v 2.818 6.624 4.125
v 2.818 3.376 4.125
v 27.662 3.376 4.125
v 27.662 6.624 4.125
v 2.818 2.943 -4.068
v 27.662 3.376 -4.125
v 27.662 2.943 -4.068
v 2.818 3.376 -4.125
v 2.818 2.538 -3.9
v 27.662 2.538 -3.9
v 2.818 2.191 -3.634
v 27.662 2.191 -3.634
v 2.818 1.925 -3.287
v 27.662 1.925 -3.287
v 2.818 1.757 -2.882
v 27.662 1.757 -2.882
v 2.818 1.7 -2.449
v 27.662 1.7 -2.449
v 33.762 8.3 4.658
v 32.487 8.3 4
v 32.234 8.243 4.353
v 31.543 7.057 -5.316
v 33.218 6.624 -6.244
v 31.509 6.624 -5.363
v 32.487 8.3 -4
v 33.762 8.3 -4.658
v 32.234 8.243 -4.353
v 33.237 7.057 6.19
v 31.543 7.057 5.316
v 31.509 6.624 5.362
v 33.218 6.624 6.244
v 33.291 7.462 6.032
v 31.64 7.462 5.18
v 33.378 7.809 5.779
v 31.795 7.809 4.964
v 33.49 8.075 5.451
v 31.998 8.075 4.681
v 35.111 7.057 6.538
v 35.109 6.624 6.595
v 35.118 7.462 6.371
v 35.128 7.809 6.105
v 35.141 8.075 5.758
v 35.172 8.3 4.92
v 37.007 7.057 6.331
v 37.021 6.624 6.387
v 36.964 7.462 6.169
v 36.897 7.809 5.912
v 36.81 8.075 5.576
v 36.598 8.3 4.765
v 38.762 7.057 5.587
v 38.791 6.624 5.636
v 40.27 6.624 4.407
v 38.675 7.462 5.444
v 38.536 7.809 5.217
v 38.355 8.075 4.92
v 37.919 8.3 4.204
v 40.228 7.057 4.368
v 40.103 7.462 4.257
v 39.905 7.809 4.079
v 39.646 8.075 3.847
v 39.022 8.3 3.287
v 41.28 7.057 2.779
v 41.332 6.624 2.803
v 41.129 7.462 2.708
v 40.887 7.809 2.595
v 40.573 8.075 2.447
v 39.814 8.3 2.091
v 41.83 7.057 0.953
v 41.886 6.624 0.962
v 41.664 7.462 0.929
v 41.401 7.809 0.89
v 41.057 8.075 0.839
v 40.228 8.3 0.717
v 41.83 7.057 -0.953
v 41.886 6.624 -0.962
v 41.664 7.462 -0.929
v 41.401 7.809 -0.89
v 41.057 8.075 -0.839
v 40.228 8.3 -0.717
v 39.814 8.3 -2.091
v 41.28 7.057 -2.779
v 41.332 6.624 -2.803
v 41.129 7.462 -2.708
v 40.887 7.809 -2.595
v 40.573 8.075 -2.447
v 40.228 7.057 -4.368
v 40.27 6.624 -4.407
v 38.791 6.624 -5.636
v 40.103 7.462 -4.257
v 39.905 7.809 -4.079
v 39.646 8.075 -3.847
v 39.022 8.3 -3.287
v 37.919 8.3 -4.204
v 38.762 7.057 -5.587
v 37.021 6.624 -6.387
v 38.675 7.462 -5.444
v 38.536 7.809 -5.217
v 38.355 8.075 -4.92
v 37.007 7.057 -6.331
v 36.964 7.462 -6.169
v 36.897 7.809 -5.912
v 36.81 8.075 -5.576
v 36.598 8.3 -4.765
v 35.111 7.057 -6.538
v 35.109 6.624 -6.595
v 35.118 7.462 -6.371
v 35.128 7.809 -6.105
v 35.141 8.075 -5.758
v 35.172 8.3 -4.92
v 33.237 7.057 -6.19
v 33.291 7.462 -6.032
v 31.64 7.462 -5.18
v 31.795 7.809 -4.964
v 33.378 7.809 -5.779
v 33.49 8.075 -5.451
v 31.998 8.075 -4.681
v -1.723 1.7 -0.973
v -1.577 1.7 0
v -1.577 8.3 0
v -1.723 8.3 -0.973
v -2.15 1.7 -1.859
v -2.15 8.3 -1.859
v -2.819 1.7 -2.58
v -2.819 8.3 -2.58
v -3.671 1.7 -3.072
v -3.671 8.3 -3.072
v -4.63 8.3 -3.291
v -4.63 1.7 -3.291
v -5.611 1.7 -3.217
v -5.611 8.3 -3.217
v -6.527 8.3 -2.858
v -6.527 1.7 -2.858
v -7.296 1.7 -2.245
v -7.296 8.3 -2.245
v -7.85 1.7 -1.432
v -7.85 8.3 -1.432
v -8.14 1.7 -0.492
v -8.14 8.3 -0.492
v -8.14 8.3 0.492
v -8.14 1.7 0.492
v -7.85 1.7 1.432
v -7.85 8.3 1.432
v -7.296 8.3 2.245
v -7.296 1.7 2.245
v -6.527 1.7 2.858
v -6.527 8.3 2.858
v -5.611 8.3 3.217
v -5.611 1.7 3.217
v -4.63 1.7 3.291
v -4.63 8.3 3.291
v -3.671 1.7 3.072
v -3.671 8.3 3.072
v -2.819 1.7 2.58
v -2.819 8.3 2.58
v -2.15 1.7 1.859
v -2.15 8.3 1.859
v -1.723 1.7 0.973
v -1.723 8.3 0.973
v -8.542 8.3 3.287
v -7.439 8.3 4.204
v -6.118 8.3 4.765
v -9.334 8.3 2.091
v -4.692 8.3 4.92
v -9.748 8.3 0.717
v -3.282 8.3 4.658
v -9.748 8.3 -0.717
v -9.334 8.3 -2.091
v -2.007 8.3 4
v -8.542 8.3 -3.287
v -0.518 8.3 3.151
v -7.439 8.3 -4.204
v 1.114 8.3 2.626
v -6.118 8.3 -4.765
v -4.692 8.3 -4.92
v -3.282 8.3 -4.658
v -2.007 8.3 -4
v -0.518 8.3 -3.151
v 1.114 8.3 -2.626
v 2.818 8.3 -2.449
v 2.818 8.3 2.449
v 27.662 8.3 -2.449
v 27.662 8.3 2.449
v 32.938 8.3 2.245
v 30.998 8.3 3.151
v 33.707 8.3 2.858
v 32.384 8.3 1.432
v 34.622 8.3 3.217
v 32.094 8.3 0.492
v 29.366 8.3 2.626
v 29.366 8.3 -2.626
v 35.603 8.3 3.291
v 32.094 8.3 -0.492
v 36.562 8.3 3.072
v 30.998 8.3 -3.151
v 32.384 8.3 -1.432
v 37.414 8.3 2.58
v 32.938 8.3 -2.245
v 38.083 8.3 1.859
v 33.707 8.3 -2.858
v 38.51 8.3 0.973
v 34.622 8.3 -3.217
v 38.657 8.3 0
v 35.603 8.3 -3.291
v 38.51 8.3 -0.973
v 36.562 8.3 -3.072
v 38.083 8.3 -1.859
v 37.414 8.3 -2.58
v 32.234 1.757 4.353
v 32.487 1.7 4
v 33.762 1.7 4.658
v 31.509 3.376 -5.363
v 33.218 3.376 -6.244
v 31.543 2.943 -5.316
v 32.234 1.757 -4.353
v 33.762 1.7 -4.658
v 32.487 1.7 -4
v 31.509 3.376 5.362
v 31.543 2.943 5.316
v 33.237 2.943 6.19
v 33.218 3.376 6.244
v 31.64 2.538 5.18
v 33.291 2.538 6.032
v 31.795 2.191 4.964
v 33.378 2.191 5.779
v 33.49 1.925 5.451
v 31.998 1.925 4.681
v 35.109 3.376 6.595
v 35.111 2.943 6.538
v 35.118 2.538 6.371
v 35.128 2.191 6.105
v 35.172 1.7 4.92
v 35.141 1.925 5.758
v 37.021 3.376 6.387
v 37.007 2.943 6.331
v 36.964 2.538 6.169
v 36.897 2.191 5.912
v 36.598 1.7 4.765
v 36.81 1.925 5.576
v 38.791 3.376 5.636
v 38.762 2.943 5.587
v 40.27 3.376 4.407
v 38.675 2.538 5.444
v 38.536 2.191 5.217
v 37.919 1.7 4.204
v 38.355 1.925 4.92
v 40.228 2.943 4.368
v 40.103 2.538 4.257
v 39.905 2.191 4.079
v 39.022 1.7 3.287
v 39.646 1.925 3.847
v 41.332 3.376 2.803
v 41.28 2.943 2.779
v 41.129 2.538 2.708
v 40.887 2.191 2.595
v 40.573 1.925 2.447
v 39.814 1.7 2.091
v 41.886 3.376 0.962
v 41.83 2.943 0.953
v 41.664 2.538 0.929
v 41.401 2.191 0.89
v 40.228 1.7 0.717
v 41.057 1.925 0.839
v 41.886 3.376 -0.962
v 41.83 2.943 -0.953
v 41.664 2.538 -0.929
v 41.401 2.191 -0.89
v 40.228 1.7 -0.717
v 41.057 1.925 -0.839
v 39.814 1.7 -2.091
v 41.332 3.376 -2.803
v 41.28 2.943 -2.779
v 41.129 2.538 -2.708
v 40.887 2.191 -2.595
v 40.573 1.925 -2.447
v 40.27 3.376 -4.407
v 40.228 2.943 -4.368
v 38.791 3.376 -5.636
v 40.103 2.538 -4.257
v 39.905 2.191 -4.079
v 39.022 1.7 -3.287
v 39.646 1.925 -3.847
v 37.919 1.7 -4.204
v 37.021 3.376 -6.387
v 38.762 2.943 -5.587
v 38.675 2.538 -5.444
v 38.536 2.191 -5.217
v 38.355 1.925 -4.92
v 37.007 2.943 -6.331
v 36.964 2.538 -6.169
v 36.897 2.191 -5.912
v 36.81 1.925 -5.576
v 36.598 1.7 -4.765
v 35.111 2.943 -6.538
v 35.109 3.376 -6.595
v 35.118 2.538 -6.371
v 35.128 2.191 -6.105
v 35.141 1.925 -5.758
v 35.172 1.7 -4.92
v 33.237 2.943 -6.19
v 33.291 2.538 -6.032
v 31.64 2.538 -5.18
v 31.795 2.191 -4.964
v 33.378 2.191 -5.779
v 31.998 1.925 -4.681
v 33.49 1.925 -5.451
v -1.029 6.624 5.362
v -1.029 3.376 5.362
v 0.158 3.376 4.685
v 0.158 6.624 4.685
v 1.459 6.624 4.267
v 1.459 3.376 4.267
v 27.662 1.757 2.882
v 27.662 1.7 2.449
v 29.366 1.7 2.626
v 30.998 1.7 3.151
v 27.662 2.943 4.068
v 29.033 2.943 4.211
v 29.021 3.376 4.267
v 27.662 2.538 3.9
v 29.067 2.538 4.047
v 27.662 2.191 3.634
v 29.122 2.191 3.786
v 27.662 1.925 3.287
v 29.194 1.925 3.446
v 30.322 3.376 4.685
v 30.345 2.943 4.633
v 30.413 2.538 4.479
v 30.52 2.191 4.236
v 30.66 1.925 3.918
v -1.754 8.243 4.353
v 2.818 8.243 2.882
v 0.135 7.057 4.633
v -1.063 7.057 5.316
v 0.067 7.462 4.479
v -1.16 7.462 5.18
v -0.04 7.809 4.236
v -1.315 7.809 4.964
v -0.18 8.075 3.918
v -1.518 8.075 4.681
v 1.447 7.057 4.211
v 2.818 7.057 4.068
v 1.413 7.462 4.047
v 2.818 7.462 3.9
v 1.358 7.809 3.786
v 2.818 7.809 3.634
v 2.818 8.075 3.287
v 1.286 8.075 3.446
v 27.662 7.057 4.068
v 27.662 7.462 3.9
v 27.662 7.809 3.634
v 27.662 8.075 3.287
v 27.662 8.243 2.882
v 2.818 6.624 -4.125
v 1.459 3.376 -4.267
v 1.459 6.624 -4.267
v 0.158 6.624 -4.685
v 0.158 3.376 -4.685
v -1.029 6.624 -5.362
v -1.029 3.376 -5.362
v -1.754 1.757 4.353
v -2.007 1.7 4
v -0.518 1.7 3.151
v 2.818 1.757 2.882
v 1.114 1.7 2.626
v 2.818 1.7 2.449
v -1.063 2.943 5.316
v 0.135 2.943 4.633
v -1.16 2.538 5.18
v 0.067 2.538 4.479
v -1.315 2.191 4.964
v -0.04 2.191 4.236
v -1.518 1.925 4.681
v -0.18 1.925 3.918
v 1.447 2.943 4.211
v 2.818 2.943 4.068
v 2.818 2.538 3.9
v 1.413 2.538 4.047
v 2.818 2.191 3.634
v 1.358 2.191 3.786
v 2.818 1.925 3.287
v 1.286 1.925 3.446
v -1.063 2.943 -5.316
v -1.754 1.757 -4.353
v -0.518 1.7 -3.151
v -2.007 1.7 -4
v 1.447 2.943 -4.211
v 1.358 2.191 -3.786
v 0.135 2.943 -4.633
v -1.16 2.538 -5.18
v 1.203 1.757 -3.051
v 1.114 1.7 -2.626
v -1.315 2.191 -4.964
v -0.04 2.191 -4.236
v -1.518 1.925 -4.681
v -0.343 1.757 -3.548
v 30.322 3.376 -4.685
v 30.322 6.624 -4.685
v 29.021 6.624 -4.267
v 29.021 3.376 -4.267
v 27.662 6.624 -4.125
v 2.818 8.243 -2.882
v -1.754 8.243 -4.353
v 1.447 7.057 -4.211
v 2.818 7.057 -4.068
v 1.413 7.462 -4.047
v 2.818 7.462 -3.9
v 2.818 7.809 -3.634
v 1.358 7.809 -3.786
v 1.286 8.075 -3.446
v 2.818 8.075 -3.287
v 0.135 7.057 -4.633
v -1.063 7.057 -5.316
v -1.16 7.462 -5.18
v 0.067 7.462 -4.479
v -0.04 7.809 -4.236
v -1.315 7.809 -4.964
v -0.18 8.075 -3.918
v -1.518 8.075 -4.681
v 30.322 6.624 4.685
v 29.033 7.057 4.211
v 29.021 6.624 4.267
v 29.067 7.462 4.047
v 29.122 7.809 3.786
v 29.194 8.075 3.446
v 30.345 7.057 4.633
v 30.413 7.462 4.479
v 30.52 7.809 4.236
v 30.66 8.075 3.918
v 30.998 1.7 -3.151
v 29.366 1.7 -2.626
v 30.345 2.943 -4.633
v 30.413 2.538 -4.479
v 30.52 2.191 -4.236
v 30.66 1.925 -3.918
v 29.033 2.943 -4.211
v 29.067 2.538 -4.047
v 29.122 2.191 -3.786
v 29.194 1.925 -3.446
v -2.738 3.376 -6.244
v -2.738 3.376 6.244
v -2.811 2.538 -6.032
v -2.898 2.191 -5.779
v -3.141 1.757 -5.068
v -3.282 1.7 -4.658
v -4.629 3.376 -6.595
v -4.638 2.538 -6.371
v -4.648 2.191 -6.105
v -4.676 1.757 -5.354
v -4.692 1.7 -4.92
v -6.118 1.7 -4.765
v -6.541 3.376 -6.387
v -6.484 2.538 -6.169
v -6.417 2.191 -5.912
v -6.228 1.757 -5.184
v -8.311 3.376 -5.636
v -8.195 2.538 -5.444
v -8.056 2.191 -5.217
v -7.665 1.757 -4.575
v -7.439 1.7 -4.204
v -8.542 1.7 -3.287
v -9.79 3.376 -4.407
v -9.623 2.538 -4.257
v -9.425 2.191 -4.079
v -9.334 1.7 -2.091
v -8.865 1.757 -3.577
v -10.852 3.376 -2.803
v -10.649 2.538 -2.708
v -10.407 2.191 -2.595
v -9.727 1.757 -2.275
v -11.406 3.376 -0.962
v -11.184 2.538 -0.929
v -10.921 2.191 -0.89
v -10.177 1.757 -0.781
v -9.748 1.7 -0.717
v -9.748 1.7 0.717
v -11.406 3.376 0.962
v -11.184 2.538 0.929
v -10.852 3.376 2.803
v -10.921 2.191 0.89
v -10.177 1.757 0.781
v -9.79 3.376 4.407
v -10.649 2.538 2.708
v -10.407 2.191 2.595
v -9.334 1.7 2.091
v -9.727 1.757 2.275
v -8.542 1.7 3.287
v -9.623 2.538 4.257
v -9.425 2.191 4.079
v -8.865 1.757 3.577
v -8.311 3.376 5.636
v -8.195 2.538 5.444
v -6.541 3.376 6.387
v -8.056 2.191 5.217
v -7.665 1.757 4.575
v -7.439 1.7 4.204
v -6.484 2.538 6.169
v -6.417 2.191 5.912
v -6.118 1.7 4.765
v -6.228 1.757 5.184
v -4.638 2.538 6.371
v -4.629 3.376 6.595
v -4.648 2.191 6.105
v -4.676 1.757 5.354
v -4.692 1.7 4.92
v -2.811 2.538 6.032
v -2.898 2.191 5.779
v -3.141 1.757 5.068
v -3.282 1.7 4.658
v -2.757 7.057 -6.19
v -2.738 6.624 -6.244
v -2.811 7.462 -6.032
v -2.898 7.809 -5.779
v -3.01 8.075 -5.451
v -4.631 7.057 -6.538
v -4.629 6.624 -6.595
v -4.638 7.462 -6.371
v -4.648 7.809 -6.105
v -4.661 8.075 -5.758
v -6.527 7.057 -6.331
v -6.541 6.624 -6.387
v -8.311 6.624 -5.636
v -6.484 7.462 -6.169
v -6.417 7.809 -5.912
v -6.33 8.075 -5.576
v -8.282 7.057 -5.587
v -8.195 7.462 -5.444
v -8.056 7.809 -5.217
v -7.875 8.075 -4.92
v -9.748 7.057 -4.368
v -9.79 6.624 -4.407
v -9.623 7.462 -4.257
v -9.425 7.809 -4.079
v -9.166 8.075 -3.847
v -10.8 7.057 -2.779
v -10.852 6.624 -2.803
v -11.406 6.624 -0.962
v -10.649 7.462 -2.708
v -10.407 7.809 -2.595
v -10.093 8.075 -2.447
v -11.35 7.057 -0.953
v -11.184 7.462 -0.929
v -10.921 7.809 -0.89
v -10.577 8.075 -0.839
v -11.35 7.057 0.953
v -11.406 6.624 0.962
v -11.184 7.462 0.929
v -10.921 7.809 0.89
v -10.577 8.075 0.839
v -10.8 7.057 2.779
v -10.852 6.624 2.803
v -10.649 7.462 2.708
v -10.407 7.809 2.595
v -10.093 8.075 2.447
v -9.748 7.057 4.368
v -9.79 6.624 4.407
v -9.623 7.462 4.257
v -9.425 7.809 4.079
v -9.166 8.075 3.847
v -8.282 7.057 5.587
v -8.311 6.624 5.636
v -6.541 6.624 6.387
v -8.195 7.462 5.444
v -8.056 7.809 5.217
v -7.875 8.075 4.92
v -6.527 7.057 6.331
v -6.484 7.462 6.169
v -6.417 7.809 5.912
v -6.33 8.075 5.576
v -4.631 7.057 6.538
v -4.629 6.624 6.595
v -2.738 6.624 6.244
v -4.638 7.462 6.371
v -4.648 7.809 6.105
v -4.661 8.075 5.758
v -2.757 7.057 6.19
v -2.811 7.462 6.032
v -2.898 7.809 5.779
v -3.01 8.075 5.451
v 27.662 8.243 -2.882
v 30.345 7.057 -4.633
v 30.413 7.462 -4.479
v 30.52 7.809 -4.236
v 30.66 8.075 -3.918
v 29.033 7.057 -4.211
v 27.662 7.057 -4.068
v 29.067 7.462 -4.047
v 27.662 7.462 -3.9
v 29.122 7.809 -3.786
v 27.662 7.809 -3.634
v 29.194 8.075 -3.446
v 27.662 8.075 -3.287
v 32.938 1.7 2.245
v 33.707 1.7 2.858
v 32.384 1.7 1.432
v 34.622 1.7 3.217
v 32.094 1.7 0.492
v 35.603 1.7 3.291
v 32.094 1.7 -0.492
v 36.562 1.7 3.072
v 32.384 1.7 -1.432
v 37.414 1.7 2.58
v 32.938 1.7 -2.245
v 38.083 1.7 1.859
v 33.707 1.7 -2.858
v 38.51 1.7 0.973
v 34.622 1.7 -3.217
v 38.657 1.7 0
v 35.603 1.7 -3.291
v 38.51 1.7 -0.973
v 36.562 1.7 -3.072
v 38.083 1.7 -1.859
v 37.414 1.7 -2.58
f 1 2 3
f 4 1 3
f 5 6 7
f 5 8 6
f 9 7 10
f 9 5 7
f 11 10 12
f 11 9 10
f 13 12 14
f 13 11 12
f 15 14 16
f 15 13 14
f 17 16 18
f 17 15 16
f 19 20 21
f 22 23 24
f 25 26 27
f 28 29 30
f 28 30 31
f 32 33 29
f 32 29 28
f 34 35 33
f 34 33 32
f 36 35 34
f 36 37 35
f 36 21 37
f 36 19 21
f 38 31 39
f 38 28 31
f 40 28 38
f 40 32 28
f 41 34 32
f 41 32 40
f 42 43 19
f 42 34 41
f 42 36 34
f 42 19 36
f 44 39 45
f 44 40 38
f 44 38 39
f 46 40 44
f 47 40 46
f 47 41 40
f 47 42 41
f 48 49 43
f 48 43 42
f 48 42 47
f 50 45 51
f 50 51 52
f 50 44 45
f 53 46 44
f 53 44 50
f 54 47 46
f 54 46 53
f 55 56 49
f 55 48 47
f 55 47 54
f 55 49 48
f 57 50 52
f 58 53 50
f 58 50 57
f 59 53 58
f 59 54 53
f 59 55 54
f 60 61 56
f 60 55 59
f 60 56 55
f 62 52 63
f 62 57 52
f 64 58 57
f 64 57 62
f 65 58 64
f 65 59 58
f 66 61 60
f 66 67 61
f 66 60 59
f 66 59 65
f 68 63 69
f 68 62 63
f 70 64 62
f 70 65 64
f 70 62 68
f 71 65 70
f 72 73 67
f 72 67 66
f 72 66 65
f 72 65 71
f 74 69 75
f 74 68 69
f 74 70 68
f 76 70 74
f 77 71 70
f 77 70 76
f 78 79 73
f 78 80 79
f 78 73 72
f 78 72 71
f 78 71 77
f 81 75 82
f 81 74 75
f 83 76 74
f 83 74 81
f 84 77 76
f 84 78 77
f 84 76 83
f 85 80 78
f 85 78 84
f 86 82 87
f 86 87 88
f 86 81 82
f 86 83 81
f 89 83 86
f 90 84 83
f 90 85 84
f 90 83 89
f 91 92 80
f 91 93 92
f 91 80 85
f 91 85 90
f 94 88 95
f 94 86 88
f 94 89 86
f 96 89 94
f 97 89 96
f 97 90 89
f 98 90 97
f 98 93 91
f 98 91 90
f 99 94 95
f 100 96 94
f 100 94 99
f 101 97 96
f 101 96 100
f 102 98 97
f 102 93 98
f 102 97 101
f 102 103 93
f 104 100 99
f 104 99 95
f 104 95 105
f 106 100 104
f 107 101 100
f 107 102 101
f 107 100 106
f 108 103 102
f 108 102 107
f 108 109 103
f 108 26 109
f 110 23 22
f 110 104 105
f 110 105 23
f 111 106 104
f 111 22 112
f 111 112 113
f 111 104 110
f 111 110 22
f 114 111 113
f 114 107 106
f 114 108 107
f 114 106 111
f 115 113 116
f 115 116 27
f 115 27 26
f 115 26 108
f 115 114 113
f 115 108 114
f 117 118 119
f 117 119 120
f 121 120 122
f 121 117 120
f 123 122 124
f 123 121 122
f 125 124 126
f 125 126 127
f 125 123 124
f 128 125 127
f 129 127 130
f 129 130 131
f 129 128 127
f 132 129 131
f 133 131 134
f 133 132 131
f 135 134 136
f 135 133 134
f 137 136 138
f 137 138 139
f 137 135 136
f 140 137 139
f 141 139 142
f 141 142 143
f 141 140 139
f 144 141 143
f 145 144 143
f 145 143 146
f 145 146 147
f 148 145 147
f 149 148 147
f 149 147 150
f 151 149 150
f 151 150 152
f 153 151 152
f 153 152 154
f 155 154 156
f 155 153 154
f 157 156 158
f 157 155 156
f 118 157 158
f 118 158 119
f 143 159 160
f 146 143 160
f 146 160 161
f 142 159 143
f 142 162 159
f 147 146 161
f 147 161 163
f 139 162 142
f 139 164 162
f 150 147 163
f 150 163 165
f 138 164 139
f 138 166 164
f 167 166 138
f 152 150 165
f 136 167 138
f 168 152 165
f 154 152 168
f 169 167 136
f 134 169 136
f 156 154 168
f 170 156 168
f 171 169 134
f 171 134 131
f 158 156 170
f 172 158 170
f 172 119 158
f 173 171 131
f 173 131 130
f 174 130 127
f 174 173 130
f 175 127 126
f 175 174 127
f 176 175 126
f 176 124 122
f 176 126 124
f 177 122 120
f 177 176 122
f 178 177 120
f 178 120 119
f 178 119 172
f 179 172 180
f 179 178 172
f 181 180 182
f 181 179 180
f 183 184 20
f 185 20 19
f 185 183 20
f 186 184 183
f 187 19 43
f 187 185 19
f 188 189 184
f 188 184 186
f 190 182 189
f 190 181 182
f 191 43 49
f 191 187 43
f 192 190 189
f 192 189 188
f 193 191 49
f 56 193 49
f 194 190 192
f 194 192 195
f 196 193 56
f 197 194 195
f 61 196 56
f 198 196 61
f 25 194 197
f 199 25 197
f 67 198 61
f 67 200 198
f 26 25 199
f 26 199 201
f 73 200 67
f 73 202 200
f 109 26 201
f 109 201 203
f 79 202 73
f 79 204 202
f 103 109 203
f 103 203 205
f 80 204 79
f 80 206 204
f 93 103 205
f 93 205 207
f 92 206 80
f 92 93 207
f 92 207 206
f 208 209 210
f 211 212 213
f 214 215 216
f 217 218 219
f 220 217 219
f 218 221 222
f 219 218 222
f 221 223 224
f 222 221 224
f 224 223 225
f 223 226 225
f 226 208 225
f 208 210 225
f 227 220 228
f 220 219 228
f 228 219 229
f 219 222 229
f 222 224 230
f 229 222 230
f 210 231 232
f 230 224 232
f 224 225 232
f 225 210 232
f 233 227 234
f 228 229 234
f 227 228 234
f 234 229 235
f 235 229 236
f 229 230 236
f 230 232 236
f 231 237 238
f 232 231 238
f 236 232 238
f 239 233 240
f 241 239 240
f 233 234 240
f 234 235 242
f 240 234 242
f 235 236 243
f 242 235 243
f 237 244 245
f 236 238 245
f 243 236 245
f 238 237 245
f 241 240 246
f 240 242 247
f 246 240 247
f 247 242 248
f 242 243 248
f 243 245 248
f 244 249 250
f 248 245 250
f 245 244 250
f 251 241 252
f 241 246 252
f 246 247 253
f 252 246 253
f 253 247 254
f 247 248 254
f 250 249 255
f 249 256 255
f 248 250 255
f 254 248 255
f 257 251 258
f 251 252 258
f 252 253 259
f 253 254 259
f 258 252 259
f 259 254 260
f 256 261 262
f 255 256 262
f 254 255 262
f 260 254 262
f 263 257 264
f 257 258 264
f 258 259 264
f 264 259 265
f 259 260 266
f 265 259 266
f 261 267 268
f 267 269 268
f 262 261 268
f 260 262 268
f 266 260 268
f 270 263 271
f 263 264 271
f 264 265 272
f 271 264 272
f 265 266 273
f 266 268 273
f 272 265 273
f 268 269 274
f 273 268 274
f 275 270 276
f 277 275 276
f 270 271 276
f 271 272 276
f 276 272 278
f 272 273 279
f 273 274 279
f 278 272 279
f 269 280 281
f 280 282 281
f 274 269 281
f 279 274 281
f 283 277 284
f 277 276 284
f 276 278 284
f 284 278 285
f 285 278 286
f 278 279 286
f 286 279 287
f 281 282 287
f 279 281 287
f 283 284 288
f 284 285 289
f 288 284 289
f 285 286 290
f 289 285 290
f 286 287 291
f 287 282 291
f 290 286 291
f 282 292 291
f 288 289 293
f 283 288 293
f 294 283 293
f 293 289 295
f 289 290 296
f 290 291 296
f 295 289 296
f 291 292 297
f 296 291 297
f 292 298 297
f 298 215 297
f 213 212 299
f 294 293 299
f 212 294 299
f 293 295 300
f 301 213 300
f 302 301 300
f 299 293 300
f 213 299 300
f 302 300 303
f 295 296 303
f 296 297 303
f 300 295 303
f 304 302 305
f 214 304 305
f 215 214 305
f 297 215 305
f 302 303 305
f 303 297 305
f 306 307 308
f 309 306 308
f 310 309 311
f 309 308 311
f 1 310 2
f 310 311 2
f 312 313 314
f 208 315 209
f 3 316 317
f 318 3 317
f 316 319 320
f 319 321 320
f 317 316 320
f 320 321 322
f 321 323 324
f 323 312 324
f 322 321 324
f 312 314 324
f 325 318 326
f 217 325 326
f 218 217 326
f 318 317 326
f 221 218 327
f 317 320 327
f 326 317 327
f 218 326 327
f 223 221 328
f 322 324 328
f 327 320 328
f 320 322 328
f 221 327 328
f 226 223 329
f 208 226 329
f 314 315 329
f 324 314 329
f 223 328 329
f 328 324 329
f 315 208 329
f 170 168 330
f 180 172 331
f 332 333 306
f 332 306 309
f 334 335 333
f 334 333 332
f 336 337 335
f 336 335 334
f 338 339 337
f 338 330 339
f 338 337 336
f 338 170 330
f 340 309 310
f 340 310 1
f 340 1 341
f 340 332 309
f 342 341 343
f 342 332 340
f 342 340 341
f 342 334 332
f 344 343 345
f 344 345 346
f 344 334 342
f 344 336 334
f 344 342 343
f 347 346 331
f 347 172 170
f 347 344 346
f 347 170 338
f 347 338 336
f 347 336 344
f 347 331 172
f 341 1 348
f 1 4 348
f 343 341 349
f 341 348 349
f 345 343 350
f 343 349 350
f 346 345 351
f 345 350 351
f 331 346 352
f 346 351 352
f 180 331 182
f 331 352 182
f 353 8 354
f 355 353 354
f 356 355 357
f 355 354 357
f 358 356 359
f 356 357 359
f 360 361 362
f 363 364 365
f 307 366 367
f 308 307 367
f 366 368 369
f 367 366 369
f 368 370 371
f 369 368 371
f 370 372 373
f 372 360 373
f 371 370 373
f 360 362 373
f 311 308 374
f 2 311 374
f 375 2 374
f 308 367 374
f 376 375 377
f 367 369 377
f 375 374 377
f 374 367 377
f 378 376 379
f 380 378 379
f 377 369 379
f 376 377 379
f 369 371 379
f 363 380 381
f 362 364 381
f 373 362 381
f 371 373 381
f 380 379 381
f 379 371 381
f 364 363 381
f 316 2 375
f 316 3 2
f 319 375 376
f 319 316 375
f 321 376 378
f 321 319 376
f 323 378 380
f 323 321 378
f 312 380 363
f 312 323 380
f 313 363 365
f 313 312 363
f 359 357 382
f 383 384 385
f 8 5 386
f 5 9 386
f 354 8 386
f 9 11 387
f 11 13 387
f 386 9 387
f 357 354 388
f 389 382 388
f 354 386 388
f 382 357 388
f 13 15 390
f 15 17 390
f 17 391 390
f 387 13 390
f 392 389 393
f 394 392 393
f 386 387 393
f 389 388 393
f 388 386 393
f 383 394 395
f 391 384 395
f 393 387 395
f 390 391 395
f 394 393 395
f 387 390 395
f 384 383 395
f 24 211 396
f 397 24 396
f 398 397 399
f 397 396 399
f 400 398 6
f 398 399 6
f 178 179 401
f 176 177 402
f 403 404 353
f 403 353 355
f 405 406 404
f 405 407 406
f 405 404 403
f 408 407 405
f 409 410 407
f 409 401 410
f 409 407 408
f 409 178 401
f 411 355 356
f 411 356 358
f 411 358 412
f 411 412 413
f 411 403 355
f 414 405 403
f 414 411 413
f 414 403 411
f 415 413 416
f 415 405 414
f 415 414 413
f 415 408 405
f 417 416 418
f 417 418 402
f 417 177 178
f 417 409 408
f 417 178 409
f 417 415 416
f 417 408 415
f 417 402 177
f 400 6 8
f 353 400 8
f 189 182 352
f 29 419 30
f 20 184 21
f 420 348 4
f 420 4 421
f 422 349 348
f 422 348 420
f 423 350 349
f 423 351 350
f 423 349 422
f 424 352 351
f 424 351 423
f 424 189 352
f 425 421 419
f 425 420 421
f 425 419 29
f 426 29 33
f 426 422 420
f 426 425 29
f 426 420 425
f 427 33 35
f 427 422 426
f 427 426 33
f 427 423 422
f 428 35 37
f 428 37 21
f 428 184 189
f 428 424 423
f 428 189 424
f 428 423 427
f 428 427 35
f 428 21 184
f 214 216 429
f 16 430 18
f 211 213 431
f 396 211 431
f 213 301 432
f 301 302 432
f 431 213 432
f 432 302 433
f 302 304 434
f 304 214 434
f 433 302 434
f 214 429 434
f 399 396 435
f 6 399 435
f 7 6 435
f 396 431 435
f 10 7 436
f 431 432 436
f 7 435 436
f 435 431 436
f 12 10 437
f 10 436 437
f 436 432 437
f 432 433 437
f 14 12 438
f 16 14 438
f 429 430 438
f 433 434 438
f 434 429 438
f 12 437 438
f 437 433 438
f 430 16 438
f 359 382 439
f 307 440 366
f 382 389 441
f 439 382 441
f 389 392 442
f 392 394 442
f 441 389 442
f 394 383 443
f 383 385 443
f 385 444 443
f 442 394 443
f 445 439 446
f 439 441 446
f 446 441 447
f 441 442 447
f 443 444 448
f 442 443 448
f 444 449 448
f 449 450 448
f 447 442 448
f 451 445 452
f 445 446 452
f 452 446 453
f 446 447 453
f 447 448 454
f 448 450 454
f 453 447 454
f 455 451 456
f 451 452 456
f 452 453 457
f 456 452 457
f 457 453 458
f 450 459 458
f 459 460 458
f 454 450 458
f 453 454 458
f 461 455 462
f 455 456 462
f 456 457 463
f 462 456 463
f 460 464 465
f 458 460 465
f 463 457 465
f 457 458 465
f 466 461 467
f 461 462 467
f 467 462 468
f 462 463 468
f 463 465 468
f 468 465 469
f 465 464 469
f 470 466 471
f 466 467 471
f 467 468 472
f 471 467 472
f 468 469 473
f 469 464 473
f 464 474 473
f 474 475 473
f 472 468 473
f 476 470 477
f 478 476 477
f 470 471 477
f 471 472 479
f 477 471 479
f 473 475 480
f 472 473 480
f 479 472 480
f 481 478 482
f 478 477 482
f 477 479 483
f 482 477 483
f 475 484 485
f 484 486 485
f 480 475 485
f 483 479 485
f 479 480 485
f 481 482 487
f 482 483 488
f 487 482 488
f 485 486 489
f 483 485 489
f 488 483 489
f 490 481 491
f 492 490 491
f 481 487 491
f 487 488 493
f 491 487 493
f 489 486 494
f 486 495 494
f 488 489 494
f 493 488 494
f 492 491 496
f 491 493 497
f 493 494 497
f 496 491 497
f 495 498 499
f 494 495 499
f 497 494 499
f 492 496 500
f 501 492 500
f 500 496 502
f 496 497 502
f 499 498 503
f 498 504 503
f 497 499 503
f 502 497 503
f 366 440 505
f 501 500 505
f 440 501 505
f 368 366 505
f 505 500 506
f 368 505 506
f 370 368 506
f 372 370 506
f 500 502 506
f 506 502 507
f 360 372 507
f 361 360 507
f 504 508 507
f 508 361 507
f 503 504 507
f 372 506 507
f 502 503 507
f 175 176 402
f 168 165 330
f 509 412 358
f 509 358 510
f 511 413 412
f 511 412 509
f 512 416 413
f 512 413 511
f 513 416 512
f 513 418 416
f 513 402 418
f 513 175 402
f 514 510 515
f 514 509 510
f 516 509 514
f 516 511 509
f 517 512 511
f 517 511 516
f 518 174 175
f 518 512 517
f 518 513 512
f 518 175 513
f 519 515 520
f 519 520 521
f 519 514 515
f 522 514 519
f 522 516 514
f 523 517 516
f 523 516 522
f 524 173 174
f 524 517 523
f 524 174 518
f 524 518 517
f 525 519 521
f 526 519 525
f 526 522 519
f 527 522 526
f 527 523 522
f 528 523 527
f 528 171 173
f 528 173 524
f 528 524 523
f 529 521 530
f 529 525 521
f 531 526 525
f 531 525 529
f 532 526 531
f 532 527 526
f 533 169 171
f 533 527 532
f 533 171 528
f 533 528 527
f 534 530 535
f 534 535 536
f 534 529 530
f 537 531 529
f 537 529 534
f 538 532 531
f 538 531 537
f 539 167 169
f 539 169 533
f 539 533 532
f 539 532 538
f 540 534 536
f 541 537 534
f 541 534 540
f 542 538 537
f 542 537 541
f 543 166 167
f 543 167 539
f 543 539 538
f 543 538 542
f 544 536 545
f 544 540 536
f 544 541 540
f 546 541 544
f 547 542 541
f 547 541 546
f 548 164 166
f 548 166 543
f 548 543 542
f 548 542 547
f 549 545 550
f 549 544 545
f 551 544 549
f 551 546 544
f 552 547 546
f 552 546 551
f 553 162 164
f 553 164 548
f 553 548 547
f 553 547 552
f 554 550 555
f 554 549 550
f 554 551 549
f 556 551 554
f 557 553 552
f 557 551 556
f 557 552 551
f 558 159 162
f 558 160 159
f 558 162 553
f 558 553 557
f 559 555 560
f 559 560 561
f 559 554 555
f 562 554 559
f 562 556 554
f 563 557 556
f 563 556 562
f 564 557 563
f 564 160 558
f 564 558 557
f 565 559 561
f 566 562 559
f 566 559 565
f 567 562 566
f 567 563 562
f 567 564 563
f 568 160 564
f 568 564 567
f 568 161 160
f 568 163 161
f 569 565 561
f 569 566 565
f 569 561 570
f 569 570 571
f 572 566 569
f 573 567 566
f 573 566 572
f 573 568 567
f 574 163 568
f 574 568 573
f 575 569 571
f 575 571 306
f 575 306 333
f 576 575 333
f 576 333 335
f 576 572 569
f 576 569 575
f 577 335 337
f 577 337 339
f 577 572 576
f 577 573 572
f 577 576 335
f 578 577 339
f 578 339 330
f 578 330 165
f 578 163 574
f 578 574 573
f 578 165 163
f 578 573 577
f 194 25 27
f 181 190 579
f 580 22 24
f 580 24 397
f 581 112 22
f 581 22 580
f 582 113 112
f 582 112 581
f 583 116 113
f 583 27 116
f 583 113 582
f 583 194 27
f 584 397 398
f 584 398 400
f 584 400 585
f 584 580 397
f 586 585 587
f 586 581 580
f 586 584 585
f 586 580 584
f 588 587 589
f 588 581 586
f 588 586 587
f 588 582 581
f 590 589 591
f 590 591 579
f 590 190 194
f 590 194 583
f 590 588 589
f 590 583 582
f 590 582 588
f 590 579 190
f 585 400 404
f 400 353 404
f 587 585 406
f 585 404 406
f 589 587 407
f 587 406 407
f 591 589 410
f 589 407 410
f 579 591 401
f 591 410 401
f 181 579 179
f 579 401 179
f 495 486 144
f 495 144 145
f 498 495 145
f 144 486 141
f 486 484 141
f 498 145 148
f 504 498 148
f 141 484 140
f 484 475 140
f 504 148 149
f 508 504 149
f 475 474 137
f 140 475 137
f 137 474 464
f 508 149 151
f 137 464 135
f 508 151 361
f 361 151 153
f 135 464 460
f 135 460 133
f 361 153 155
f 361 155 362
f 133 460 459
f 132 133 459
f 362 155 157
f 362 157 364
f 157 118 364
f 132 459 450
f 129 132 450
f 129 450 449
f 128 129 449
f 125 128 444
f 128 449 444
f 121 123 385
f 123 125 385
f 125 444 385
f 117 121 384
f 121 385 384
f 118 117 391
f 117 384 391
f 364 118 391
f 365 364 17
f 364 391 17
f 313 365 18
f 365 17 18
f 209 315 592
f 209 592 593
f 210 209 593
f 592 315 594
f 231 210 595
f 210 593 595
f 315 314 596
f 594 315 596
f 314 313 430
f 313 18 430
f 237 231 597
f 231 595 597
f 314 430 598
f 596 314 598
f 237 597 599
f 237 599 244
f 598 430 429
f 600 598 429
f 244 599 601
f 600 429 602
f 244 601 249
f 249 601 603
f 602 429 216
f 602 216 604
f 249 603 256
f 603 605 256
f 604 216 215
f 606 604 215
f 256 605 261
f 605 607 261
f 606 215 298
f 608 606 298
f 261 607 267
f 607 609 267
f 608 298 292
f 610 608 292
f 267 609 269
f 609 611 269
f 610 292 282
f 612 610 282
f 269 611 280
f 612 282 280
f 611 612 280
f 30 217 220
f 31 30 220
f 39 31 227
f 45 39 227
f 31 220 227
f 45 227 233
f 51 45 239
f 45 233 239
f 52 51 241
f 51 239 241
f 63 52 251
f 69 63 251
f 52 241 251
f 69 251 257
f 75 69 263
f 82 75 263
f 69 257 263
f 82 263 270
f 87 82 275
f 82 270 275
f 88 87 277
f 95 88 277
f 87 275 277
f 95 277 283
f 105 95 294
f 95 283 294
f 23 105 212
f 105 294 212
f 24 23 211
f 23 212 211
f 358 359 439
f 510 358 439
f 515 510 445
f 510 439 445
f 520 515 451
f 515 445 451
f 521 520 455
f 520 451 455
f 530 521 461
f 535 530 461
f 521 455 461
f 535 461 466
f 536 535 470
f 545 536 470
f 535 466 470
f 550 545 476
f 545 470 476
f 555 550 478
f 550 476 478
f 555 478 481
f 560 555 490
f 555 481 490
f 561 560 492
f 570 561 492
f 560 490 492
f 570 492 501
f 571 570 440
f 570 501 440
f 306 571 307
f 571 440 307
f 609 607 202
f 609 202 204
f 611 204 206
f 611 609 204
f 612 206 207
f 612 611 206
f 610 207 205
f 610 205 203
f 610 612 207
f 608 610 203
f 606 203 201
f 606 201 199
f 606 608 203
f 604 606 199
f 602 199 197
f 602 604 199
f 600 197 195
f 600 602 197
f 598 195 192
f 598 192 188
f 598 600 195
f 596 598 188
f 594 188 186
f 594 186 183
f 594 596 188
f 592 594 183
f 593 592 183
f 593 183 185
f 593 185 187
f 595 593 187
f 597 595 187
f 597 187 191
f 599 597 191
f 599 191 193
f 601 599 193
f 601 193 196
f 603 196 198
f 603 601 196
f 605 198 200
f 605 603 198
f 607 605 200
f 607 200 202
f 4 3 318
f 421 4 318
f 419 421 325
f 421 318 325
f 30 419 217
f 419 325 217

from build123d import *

# Parameters (mm, degrees)
SKETCH1_R           = 5
BOSS_EXTRUDE1_DEPTH = 10
FILLET1_R           = 2.54
SCALE1_SCALE        = 0.66


with BuildPart() as part:
    # Sketch1 → Boss-Extrude1 (new body)
    with BuildSketch(Plane(origin=(0, 0, 0), x_dir=(1, 0, 0), z_dir=(0, 1, 0))):
        with BuildLine():
            Line((-3.580776184, -6.25), (34.060776184, -6.25))
            ThreePointArc((34.060776184, -6.25), (37.122638362, -6.730283618), (39.890388092, -8.125))
            ThreePointArc((39.890388092, -8.125), (55.72, 0), (39.890388092, 8.125))
            ThreePointArc((39.890388092, 8.125), (37.122638362, 6.730283618), (34.060776184, 6.25))
            Line((34.060776184, 6.25), (-3.580776184, 6.25))
            ThreePointArc((-3.580776184, 6.25), (-6.642638362, 6.730283618), (-9.410388092, 8.125))
            ThreePointArc((-9.410388092, 8.125), (-25.24, 0), (-9.410388092, -8.125))
            ThreePointArc((-9.410388092, -8.125), (-6.642638362, -6.730283618), (-3.580776184, -6.25))
        make_face()
        with Locations((-15.24, 0)):
            Circle(SKETCH1_R, mode=Mode.SUBTRACT)
        with Locations((45.72, 0)):
            Circle(SKETCH1_R, mode=Mode.SUBTRACT)
    extrude(amount=BOSS_EXTRUDE1_DEPTH)

    # Fillet1
    fillet1_edges = [part.edges().sort_by_distance(p)[0] for p in [
        (-6.642638362, 10, 6.730283618),
        (-25.24, 0, 0),
        (-6.642638362, 0, -6.730283618),
        (15.24, 10, 6.25),
        (37.122638362, 10, 6.730283618),
        (55.72, 10, 0),
        (37.122638362, 10, -6.730283618),
        (15.24, 10, -6.25),
        (-6.642638362, 10, -6.730283618),
        (-25.24, 10, 0),
        (15.24, 0, -6.25),
        (37.122638362, 0, -6.730283618),
        (55.72, 0, 0),
        (37.122638362, 0, 6.730283618),
        (15.24, 0, 6.25),
        (-6.642638362, 0, 6.730283618),
    ]]
    fillet(fillet1_edges, radius=FILLET1_R)


with BuildPart() as part_1:
    # Scale1: scaled about (15.24, 5, 0)
    add(part.part.scale(SCALE1_SCALE).moved(Location((5.1816, 1.7, 0))))


solid = part_1.part
